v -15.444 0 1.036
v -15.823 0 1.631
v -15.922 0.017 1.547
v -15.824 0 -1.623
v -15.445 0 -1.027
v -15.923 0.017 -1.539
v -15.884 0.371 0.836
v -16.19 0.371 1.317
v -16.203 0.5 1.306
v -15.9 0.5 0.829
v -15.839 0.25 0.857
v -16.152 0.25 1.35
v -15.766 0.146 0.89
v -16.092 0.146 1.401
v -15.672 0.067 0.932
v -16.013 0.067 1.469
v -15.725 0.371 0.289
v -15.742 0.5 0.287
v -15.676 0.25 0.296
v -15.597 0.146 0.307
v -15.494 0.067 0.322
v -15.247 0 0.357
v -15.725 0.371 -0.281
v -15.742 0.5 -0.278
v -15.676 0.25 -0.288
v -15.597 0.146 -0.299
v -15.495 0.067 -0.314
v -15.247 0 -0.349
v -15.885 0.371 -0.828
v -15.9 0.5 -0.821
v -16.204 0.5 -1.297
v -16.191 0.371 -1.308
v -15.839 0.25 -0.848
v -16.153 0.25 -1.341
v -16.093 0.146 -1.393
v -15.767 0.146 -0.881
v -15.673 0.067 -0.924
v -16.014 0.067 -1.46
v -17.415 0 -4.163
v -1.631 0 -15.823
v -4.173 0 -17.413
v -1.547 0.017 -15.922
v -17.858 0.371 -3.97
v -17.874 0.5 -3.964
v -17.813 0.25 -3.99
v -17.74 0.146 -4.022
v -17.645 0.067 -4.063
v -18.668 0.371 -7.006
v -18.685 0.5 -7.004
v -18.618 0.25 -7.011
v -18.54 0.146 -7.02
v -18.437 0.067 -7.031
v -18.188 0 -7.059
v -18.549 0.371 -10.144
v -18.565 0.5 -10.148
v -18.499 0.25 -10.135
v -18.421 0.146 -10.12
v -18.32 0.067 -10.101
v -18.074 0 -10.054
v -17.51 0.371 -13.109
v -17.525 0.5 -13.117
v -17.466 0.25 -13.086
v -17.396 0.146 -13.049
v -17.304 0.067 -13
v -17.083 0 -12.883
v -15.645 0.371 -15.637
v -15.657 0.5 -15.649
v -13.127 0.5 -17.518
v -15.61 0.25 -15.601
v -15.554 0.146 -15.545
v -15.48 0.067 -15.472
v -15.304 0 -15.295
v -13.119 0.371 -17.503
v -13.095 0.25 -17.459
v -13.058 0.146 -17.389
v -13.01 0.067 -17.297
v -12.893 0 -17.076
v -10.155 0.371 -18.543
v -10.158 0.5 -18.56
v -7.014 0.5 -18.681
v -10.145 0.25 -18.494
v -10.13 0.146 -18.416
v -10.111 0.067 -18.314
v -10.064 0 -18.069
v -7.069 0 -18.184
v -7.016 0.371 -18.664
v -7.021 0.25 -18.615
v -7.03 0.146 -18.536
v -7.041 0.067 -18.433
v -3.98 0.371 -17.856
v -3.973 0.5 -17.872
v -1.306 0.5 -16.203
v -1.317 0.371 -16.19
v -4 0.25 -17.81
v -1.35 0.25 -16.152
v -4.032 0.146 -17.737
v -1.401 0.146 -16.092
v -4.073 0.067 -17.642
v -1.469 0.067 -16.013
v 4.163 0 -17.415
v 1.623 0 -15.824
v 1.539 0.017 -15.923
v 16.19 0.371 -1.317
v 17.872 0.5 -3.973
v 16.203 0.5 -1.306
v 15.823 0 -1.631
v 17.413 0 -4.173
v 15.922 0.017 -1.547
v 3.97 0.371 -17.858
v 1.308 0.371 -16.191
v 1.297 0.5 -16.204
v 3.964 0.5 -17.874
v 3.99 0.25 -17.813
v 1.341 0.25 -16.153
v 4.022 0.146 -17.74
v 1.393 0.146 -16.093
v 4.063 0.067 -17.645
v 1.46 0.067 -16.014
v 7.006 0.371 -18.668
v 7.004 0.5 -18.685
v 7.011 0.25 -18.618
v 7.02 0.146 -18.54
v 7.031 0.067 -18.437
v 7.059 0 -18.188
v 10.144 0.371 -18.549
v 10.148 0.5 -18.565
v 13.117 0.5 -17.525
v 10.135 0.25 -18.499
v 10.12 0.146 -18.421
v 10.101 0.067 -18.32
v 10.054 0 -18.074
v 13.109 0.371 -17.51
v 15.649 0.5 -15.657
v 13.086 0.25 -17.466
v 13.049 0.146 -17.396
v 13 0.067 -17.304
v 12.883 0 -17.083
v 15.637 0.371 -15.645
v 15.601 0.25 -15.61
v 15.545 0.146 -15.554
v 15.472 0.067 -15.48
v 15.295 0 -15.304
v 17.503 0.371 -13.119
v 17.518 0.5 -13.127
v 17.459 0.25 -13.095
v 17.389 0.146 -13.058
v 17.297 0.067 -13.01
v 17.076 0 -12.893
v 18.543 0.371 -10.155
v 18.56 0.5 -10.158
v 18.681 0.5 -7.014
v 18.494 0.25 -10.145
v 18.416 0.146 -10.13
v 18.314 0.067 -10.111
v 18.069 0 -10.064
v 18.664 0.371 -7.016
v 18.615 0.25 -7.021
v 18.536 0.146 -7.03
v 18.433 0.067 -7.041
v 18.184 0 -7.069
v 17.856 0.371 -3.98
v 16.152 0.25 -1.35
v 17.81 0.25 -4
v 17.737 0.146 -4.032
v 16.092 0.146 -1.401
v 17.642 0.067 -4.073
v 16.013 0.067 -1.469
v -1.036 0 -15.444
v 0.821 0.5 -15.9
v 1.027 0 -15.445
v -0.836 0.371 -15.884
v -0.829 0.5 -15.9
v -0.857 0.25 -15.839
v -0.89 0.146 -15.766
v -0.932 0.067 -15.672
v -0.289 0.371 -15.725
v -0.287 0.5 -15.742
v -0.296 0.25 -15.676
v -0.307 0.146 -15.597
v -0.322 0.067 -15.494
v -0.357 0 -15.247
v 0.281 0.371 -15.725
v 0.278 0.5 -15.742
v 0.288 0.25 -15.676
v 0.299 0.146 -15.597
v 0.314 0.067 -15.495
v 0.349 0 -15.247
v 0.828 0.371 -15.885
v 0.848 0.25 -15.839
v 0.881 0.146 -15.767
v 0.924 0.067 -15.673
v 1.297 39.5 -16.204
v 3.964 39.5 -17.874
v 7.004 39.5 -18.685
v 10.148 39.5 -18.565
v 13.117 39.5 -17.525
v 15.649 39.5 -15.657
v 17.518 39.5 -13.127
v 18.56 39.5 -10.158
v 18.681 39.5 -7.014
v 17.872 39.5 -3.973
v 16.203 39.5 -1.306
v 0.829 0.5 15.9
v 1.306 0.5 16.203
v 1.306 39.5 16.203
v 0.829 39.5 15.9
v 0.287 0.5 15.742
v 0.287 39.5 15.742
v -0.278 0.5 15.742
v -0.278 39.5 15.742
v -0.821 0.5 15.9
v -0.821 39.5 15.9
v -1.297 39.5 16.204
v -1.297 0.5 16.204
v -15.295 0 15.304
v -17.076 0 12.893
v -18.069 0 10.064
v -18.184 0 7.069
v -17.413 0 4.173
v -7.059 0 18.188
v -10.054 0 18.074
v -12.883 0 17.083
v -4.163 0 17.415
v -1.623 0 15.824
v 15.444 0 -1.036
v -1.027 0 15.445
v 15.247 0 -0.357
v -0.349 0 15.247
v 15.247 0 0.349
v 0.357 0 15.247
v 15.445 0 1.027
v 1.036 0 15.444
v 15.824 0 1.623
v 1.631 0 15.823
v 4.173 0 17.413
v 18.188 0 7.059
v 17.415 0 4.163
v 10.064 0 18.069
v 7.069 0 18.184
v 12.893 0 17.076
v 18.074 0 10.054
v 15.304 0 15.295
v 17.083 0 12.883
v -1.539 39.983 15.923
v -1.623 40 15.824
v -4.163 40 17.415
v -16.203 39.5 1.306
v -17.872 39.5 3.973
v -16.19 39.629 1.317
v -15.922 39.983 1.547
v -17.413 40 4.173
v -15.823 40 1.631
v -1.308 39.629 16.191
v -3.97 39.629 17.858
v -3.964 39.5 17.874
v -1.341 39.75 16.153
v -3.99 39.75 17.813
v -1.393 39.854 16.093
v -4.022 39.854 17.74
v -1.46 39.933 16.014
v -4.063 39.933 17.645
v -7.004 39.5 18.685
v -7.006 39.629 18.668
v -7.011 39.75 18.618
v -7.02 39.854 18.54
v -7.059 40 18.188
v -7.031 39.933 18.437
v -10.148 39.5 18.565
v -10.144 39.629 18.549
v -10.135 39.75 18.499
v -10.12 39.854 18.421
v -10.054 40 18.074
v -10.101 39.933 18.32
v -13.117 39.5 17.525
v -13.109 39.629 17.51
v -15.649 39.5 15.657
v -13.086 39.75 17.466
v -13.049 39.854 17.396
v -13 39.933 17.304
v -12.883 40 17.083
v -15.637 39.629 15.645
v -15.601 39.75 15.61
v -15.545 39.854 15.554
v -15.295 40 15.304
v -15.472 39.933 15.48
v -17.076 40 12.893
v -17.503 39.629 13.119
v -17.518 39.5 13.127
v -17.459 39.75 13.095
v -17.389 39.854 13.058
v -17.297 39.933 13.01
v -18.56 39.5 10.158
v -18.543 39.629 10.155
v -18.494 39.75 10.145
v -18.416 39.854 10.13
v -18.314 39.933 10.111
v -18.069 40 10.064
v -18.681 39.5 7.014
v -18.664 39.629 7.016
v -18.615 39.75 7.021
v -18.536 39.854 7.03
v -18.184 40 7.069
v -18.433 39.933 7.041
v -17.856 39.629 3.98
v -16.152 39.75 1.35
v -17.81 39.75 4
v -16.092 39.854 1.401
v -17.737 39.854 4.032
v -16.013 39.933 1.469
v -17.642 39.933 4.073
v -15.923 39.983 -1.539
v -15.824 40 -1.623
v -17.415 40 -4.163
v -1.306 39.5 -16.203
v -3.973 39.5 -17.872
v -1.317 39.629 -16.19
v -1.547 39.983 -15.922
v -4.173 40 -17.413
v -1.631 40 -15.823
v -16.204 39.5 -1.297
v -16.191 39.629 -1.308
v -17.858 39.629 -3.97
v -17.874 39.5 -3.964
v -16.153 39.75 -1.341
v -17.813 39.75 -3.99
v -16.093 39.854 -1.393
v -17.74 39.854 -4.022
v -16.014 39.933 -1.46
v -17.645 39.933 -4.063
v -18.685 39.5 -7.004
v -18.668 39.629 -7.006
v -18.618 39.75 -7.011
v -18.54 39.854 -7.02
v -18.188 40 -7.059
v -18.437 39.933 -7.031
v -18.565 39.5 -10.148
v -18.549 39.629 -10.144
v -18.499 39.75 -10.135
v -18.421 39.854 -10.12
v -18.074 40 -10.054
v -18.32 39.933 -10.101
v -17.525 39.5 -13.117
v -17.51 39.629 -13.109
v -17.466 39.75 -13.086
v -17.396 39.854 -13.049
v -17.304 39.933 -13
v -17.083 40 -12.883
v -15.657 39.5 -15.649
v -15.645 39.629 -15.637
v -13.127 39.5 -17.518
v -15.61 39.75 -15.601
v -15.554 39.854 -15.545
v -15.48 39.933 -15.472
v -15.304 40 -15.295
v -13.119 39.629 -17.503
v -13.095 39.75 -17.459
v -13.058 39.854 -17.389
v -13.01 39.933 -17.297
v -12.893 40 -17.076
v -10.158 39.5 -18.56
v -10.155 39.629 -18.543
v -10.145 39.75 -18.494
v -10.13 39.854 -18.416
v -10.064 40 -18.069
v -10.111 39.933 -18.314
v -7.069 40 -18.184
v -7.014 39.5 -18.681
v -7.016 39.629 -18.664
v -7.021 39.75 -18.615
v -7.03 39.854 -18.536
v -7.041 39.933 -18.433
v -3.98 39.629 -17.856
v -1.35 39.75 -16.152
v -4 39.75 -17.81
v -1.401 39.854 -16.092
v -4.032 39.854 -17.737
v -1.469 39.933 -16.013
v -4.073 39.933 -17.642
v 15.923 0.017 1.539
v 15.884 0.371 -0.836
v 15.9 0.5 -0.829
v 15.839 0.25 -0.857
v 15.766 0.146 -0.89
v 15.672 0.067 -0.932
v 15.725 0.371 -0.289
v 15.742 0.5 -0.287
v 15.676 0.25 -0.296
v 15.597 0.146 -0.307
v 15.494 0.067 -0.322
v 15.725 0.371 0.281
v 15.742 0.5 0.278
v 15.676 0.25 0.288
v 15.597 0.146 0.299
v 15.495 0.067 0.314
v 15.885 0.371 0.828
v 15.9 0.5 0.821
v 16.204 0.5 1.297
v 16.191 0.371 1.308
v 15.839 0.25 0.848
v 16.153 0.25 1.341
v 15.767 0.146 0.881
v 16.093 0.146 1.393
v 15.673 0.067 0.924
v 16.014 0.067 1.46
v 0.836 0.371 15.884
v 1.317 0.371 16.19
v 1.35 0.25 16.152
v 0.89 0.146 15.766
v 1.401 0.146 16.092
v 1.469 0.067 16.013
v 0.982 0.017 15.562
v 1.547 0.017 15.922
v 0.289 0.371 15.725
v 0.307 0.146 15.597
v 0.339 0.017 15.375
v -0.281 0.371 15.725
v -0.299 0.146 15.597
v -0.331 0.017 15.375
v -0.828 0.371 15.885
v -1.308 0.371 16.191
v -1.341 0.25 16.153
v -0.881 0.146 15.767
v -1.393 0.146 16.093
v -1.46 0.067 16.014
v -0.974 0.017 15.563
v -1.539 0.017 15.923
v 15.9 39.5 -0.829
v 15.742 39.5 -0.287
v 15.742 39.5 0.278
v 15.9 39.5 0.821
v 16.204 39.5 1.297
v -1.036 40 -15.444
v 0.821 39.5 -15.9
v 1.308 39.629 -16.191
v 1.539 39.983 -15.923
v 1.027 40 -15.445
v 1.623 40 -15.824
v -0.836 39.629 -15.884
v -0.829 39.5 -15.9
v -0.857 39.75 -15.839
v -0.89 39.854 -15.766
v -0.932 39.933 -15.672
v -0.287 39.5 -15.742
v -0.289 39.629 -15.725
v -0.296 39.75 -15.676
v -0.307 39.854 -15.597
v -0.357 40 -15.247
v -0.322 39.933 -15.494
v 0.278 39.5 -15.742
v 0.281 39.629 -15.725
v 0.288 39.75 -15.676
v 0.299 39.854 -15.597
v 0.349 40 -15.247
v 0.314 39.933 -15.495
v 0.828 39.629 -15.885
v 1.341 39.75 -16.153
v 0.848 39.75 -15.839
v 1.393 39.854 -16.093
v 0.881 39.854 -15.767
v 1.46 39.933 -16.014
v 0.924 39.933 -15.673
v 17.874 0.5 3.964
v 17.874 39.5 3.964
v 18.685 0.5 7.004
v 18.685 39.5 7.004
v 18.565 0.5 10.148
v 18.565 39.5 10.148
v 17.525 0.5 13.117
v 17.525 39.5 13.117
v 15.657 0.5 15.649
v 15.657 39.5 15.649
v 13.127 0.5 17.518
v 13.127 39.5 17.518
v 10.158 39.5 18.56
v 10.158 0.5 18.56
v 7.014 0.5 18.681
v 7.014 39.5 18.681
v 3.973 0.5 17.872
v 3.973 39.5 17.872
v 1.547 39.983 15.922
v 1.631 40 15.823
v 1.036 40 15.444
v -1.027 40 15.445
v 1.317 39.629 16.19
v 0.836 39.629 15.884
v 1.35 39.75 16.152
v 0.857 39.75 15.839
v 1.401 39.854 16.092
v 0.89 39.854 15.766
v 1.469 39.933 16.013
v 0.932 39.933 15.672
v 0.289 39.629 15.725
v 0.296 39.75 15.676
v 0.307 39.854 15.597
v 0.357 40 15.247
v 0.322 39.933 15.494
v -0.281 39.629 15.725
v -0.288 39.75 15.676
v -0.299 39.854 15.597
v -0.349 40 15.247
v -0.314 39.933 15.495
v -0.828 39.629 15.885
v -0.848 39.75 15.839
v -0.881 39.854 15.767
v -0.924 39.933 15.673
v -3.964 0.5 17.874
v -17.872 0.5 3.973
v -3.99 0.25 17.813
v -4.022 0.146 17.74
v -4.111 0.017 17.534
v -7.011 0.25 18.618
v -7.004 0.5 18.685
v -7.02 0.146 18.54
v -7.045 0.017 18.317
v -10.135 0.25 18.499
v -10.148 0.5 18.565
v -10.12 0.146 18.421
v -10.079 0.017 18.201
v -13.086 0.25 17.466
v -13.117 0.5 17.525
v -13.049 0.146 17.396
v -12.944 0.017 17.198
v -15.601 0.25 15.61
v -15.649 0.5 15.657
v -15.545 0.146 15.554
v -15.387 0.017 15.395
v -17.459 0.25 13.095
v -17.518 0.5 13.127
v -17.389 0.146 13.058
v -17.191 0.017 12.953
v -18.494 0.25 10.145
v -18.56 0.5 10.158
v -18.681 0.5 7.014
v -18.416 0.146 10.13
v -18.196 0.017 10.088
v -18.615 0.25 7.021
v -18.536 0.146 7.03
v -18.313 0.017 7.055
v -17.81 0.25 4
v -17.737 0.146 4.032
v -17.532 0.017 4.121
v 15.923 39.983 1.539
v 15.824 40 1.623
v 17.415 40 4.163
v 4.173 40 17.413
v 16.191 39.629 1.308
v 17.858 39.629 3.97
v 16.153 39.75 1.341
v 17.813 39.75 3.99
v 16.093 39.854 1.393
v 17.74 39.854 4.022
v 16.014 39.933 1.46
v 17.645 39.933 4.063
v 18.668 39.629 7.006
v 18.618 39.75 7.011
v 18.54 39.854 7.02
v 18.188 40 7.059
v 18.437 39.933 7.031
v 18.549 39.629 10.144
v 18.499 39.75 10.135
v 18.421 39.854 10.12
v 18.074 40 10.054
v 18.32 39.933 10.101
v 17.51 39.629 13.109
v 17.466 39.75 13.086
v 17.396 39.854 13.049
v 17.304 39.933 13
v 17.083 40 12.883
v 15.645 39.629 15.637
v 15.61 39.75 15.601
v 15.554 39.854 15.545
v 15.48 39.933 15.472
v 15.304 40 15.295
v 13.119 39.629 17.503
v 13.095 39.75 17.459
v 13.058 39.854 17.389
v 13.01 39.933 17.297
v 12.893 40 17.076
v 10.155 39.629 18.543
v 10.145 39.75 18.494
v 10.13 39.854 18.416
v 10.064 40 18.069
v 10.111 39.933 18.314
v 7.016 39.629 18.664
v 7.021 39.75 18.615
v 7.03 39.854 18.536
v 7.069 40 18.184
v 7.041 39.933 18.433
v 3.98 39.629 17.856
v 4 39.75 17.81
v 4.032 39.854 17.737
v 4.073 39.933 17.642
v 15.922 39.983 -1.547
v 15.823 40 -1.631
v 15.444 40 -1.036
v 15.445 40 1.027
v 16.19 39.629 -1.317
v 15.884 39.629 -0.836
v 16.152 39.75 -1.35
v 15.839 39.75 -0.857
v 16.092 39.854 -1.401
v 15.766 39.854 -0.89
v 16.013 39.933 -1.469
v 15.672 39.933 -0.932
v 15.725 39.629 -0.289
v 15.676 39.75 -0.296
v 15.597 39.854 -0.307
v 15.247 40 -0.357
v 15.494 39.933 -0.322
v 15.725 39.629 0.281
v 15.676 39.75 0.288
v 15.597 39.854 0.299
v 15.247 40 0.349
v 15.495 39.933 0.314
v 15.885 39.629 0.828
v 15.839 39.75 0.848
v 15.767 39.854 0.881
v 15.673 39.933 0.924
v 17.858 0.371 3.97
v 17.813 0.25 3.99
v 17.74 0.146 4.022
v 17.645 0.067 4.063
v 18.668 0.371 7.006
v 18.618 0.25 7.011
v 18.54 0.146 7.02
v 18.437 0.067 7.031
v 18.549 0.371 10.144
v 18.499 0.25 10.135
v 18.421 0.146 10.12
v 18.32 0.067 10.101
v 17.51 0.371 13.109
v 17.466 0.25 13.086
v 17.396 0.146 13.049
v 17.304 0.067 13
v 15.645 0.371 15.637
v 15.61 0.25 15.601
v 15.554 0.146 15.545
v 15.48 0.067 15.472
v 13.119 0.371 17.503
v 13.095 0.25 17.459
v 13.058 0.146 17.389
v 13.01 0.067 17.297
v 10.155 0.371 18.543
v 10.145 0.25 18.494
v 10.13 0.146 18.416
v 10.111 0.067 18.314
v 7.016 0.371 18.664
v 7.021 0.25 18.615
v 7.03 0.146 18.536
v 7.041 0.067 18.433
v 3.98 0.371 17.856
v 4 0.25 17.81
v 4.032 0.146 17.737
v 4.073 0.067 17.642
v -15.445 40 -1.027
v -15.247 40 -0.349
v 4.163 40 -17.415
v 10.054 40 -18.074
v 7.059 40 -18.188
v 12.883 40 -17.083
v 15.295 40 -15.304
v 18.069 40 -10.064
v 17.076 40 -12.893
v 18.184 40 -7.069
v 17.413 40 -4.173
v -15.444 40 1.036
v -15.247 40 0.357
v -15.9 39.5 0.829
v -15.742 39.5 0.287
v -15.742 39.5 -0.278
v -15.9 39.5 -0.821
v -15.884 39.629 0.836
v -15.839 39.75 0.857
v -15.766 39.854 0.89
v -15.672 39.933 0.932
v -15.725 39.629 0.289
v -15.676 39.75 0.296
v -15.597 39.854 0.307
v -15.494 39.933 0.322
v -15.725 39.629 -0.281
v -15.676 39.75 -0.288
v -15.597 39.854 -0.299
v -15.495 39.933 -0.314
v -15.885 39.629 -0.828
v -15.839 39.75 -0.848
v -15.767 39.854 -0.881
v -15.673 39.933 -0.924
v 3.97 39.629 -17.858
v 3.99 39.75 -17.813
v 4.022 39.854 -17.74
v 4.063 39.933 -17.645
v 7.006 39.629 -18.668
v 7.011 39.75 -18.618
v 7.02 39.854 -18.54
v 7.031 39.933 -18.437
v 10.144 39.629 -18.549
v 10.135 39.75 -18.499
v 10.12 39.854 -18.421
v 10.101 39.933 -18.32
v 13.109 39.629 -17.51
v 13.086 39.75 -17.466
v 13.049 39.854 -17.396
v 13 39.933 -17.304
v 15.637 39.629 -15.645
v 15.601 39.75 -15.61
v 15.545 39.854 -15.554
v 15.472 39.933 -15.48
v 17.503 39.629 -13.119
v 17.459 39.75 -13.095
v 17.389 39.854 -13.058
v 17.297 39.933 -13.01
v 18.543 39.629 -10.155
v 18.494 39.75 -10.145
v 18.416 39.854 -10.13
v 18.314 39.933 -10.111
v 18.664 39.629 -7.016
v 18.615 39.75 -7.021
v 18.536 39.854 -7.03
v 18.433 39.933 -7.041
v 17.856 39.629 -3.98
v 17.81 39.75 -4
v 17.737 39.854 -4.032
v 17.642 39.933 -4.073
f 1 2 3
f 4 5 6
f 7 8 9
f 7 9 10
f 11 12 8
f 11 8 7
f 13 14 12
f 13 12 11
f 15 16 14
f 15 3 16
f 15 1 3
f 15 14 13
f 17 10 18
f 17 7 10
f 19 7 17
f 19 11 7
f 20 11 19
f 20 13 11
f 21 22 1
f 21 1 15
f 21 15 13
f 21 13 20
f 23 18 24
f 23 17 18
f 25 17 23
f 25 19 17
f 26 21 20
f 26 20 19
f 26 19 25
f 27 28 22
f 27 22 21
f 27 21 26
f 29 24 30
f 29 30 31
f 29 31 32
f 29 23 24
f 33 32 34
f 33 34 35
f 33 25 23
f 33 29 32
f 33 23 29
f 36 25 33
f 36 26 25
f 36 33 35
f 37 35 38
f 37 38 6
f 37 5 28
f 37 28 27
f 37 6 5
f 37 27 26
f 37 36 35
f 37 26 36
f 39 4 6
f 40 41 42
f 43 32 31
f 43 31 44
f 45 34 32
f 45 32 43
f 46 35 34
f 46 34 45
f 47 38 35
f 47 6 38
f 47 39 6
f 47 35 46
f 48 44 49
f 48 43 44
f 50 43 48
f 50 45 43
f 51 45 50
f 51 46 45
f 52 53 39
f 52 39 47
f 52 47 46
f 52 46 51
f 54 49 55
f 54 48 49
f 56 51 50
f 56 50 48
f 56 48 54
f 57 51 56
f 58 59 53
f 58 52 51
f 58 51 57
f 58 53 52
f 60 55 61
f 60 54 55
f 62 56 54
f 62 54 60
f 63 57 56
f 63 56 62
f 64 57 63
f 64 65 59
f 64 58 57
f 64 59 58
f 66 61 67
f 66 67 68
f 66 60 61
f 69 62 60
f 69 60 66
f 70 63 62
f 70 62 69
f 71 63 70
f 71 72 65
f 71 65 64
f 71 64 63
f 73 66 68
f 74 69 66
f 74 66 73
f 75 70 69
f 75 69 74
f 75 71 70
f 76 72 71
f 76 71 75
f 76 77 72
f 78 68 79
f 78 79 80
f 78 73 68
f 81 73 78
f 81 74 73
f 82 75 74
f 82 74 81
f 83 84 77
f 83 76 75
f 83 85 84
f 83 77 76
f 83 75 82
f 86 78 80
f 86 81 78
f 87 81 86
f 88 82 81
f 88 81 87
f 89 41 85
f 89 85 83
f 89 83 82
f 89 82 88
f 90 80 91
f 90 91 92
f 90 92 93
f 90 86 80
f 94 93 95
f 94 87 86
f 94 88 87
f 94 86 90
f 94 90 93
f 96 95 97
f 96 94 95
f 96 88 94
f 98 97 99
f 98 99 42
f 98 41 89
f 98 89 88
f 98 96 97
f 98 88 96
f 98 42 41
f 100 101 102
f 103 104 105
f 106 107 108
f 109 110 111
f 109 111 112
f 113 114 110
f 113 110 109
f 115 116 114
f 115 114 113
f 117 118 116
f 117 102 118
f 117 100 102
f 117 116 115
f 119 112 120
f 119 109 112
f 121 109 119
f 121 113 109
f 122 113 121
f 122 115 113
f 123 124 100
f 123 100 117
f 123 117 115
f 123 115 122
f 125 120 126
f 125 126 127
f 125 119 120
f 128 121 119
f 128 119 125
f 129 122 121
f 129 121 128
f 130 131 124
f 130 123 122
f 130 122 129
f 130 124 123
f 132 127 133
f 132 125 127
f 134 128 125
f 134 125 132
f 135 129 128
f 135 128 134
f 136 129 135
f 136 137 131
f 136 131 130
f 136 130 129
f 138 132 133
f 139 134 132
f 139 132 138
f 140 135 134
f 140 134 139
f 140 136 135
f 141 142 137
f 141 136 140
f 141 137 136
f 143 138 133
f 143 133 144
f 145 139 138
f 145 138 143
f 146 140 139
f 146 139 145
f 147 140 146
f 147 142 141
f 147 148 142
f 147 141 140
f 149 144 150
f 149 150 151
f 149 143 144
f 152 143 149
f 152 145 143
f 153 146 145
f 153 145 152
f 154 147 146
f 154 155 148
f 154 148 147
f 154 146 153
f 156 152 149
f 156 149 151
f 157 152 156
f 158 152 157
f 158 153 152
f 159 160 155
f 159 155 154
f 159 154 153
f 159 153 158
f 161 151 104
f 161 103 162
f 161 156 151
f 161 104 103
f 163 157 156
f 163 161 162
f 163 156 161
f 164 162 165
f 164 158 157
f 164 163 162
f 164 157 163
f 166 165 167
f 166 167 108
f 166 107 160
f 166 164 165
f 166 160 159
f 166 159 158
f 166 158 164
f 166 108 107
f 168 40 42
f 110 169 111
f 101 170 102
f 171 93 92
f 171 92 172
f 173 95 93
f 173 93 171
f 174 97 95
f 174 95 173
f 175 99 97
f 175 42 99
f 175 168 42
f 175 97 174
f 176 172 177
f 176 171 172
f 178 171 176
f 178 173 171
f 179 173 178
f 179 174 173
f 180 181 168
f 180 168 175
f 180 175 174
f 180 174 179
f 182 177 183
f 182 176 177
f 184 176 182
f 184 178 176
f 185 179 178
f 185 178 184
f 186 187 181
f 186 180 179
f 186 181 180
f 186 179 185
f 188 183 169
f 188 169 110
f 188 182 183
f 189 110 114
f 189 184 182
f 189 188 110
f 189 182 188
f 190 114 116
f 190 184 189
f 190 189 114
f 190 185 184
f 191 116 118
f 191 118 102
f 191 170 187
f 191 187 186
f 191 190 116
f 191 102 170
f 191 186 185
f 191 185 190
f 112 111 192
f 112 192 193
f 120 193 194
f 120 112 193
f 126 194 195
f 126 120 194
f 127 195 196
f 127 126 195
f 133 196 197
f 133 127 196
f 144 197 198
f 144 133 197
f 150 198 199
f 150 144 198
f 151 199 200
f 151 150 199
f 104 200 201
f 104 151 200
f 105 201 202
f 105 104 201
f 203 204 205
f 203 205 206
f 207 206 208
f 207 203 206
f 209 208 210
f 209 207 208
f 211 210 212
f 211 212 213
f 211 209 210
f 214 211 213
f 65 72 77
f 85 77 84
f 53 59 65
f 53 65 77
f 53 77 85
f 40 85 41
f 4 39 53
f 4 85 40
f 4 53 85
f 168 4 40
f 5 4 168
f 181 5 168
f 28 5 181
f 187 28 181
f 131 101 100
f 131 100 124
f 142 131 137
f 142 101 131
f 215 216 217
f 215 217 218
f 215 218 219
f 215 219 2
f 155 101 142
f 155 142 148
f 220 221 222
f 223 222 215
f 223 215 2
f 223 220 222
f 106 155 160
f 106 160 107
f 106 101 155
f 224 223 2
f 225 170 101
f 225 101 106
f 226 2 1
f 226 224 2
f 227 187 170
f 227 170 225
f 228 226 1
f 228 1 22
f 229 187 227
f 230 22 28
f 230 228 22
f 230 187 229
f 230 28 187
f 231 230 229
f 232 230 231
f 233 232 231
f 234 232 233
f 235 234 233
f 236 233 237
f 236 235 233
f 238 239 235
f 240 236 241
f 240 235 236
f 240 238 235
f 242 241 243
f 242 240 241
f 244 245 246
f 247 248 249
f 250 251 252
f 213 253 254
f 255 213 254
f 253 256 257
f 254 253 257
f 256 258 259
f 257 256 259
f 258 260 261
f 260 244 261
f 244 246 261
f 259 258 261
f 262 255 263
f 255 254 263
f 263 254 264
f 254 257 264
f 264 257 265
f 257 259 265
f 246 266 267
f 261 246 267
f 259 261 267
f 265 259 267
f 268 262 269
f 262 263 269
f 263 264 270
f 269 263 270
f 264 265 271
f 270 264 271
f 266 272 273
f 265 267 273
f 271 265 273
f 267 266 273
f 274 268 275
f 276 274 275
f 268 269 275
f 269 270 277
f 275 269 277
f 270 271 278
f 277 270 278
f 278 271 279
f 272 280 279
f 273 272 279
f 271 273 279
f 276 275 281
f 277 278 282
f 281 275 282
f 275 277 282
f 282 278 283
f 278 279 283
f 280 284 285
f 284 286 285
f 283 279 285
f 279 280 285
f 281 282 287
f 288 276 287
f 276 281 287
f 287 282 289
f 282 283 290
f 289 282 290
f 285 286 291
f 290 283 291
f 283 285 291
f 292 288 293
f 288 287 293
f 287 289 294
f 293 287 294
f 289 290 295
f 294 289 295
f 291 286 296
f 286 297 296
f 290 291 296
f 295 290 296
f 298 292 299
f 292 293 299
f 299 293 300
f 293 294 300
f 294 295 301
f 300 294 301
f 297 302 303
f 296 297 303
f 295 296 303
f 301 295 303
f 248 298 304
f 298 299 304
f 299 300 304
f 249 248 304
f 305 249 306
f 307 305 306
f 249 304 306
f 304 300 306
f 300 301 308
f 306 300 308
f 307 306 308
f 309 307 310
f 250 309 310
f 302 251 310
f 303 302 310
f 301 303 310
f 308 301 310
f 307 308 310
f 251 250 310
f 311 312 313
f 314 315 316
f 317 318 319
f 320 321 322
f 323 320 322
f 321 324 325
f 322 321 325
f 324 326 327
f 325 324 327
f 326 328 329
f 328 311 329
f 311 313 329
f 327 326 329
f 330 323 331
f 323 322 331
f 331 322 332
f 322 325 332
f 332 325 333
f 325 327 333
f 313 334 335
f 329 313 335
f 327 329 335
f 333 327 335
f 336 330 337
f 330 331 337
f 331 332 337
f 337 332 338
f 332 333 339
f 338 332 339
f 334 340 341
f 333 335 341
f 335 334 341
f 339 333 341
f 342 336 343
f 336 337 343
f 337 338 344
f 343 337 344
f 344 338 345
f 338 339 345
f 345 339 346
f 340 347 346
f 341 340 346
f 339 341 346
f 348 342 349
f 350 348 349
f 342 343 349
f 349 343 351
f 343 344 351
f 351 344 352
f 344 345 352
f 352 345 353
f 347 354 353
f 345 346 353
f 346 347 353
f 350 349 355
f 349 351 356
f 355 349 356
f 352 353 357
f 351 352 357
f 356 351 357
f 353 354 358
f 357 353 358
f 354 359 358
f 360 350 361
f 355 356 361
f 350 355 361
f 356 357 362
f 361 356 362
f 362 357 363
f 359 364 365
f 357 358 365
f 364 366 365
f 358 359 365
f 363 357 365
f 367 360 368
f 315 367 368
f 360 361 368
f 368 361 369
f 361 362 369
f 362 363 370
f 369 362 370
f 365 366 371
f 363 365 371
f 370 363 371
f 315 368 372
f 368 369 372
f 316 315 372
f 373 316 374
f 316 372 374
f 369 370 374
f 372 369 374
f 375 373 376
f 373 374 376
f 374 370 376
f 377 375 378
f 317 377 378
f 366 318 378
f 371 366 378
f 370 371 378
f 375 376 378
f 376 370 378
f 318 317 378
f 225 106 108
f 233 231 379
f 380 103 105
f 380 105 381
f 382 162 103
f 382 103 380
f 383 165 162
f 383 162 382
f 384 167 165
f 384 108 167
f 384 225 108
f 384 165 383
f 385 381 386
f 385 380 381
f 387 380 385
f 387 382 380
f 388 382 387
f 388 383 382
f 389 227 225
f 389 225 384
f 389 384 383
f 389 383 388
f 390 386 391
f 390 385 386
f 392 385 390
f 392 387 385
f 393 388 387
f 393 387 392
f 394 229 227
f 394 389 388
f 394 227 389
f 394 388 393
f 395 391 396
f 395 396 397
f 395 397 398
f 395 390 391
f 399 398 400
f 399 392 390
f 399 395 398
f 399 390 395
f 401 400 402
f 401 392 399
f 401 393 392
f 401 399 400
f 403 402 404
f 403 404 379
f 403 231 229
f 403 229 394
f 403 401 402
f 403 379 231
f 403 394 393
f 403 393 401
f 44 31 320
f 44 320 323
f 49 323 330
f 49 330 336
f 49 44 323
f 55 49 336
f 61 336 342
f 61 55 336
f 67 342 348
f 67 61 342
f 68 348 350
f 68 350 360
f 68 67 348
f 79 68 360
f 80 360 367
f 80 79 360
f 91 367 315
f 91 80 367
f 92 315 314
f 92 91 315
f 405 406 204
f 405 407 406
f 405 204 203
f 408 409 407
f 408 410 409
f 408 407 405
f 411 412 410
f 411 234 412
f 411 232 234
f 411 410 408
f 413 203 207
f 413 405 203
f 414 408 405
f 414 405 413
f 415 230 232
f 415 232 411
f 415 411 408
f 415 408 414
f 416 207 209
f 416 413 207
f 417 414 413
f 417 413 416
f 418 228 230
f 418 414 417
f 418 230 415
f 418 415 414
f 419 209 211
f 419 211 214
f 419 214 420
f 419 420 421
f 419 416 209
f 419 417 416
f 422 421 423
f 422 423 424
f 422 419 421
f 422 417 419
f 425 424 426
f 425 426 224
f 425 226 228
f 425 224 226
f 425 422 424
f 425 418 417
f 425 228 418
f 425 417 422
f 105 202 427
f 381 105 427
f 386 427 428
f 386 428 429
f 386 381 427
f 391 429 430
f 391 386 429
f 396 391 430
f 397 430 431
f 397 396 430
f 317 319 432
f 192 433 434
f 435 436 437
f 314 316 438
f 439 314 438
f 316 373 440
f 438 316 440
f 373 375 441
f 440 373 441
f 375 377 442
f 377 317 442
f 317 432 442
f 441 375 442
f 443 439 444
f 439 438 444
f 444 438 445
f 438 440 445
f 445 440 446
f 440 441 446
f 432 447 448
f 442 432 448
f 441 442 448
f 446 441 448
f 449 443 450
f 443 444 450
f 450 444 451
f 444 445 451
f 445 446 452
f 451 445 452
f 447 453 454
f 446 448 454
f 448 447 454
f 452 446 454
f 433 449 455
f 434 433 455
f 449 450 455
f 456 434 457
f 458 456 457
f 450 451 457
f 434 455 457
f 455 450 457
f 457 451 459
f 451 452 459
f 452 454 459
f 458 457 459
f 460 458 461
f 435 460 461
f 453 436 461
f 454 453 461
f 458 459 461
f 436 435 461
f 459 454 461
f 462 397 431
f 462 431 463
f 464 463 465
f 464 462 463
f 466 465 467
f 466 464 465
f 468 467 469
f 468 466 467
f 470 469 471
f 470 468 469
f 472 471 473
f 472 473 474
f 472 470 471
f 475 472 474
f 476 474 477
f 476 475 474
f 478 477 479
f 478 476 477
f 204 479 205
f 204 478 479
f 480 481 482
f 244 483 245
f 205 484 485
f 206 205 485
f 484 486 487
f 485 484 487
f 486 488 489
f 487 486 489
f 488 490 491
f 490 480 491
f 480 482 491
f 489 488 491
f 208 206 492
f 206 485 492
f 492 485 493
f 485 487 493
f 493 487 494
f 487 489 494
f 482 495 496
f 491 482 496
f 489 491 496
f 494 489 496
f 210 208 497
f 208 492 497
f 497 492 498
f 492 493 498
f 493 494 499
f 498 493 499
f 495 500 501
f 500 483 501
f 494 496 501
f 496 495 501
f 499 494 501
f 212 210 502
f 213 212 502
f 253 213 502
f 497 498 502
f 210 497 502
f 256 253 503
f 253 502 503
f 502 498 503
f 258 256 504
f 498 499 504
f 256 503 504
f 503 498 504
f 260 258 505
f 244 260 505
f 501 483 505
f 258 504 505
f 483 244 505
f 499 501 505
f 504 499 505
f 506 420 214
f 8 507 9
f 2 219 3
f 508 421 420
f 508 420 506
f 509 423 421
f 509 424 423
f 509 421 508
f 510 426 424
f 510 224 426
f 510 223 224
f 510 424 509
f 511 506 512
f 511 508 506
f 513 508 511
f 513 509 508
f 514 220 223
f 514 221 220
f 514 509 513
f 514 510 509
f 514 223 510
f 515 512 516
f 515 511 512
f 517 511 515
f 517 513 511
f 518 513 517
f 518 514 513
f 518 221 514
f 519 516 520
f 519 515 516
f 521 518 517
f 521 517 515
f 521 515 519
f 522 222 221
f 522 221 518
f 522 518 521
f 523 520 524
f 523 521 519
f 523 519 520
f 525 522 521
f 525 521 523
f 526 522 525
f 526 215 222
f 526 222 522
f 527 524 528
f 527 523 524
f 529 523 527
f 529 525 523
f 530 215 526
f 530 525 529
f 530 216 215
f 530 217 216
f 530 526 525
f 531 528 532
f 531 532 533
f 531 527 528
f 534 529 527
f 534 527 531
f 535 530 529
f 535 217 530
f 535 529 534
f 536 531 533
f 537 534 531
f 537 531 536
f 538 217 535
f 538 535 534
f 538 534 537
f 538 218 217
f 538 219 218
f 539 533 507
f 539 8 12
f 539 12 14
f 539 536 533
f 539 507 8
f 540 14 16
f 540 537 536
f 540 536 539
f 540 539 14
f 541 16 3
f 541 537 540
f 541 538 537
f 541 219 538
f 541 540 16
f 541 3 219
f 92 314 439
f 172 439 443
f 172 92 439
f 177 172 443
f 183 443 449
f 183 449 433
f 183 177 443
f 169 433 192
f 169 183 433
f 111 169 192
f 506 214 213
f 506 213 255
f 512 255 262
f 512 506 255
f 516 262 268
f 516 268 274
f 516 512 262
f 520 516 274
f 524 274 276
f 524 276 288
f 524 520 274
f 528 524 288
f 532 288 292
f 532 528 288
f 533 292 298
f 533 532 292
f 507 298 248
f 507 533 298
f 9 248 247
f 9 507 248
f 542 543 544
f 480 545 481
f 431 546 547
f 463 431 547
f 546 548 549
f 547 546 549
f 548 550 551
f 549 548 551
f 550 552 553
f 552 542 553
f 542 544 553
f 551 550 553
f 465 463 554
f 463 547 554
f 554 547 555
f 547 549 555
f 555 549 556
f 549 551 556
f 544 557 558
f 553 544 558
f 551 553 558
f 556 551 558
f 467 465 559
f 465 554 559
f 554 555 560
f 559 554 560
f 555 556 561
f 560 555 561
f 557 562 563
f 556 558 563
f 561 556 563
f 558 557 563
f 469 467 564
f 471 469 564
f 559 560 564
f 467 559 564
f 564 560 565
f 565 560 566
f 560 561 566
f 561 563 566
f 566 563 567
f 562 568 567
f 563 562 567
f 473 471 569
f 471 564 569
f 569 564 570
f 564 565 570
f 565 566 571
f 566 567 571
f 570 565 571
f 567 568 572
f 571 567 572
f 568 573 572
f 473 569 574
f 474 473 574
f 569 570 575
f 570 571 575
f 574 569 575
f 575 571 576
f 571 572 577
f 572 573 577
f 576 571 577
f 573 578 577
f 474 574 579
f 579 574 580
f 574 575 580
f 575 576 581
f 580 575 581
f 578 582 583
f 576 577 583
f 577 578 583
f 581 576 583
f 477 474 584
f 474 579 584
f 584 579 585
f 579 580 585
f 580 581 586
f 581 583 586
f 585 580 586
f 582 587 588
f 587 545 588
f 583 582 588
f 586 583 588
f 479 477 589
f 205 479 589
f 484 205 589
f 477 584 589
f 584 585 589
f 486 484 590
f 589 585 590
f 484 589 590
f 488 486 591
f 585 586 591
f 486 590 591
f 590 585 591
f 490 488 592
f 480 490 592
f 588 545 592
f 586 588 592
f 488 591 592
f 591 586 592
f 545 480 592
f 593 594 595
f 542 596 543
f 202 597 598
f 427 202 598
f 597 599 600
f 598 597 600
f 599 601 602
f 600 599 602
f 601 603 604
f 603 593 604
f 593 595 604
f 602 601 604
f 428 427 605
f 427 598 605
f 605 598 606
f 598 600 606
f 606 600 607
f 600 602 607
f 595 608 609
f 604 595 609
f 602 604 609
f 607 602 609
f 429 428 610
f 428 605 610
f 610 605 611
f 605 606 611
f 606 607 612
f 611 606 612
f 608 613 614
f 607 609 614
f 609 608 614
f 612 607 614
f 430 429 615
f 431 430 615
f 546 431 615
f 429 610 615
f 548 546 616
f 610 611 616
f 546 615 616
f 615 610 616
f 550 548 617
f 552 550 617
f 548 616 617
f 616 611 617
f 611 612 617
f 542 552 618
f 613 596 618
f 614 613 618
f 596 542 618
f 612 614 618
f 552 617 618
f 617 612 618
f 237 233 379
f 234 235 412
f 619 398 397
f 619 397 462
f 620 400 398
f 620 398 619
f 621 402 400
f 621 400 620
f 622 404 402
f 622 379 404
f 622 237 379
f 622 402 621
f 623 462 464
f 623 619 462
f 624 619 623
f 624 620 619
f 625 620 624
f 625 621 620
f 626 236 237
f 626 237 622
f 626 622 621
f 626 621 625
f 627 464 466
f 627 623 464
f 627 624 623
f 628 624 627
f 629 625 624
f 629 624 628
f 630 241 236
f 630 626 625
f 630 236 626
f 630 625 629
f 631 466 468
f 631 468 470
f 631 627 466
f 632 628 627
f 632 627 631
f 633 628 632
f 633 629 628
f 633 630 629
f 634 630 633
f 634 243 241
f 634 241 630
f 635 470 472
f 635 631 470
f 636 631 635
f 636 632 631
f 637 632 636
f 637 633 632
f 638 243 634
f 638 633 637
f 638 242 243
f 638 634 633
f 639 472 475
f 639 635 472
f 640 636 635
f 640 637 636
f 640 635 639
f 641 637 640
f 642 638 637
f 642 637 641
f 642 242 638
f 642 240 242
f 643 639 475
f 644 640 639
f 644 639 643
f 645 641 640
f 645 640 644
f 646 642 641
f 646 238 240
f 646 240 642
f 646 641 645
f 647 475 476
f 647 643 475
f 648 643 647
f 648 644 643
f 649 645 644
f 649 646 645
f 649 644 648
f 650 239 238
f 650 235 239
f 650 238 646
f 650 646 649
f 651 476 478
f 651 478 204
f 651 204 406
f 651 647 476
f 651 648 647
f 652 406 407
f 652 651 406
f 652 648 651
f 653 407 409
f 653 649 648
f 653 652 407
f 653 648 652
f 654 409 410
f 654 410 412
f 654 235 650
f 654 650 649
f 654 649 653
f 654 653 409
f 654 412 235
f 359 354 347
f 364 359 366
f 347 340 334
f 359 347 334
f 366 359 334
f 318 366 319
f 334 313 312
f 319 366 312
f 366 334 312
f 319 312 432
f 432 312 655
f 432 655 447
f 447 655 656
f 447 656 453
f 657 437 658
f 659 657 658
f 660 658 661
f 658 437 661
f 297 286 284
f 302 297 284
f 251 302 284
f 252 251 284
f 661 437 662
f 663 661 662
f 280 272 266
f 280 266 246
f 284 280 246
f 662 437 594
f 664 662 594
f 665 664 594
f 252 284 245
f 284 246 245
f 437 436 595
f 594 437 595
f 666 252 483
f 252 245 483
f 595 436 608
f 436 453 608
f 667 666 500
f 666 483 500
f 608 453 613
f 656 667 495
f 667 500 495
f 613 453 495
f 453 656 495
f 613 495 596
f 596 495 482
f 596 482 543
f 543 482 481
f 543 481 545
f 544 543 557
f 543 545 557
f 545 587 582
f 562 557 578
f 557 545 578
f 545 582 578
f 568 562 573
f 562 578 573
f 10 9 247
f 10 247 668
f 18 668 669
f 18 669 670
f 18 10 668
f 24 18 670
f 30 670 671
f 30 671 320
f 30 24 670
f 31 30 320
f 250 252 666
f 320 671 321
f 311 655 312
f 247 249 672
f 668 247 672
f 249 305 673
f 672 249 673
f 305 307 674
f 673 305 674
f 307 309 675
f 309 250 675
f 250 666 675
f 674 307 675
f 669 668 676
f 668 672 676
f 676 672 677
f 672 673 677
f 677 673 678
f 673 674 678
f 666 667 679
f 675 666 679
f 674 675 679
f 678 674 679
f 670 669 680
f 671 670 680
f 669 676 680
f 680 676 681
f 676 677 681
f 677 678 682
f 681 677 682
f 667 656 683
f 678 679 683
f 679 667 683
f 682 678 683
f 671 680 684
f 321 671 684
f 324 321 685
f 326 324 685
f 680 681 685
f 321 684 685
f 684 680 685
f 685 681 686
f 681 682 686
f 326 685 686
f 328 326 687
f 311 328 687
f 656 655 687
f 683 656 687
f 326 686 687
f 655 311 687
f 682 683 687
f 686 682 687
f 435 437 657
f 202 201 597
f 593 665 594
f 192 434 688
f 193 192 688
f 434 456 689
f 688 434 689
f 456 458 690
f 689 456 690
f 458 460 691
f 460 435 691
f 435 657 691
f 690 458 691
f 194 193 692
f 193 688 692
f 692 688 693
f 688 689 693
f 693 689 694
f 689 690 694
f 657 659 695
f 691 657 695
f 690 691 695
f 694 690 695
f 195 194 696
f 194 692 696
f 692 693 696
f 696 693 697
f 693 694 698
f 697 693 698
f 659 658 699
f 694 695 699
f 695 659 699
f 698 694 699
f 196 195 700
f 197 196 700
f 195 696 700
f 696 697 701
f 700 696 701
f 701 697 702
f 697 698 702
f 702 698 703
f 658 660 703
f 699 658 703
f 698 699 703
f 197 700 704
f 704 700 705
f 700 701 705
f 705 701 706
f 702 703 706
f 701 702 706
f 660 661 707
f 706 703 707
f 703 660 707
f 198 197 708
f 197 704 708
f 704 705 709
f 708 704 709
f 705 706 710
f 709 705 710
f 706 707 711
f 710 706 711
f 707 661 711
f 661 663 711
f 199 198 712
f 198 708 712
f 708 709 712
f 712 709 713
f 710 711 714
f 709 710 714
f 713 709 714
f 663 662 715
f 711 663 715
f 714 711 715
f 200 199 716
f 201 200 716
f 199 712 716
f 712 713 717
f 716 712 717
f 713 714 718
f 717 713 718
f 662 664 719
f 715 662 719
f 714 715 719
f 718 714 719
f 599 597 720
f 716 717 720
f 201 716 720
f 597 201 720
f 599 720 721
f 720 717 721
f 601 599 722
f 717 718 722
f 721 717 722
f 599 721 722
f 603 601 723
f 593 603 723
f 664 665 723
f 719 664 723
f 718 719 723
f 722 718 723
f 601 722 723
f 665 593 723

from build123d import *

# Parameters (mm, degrees)
BOSS_EXTRUDE1_DEPTH = 40
FILLET1_R           = 0.5


with BuildPart() as part:
    # Sketch1 → Boss-Extrude1 (new body)
    with BuildSketch(Plane(origin=(0, 0, 0), x_dir=(-1, 0, 0), z_dir=(0, 1, 0))):
        with BuildLine():
            ThreePointArc((-1.297272016, -16.203890569), (-15.648623862, -15.657161397), (-16.203180401, -1.306109879))
            ThreePointArc((-16.203180401, -1.306109879), (-15.721955807, -0.004287594), (-16.203890363, 1.29727203))
            ThreePointArc((-16.203890363, 1.29727203), (-15.657161191, 15.648623877), (-1.306109674, 16.203180415))
            ThreePointArc((-1.306109674, 16.203180415), (-0.004287389, 15.721955821), (1.297272236, 16.203890378))
            ThreePointArc((1.297272236, 16.203890378), (15.648624082, 15.657161206), (16.203180621, 1.306109688))
            ThreePointArc((16.203180621, 1.306109688), (15.721956027, 0.004287403), (16.203890583, -1.297272221))
            ThreePointArc((16.203890583, -1.297272221), (15.657161411, -15.648624068), (1.306109893, -16.203180607))
            ThreePointArc((1.306109893, -16.203180607), (0.004287608, -15.721956013), (-1.297272016, -16.203890569))
        make_face()
    extrude(amount=BOSS_EXTRUDE1_DEPTH)

    # Fillet1
    fillet1_edges = [part.edges().sort_by_distance(p)[0] for p in [
        (-15.648624082, 0, 15.657161206),
        (-15.721956027, 0, 0.004287403),
        (-15.657161411, 0, -15.648624068),
        (-0.004287608, 0, -15.721956013),
        (-15.721956027, 40, 0.004287403),
        (-15.648624082, 40, 15.657161206),
        (0.004287389, 40, 15.721955821),
        (15.657161191, 40, 15.648623877),
        (15.721955807, 40, -0.004287594),
        (15.648623862, 40, -15.657161397),
        (-0.004287608, 40, -15.721956013),
        (15.648623862, 0, -15.657161397),
        (-15.657161411, 40, -15.648624068),
        (15.721955807, 0, -0.004287594),
        (15.657161191, 0, 15.648623877),
        (0.004287389, 0, 15.721955821),
    ]]
    fillet(fillet1_edges, radius=FILLET1_R)


solid = part.part
